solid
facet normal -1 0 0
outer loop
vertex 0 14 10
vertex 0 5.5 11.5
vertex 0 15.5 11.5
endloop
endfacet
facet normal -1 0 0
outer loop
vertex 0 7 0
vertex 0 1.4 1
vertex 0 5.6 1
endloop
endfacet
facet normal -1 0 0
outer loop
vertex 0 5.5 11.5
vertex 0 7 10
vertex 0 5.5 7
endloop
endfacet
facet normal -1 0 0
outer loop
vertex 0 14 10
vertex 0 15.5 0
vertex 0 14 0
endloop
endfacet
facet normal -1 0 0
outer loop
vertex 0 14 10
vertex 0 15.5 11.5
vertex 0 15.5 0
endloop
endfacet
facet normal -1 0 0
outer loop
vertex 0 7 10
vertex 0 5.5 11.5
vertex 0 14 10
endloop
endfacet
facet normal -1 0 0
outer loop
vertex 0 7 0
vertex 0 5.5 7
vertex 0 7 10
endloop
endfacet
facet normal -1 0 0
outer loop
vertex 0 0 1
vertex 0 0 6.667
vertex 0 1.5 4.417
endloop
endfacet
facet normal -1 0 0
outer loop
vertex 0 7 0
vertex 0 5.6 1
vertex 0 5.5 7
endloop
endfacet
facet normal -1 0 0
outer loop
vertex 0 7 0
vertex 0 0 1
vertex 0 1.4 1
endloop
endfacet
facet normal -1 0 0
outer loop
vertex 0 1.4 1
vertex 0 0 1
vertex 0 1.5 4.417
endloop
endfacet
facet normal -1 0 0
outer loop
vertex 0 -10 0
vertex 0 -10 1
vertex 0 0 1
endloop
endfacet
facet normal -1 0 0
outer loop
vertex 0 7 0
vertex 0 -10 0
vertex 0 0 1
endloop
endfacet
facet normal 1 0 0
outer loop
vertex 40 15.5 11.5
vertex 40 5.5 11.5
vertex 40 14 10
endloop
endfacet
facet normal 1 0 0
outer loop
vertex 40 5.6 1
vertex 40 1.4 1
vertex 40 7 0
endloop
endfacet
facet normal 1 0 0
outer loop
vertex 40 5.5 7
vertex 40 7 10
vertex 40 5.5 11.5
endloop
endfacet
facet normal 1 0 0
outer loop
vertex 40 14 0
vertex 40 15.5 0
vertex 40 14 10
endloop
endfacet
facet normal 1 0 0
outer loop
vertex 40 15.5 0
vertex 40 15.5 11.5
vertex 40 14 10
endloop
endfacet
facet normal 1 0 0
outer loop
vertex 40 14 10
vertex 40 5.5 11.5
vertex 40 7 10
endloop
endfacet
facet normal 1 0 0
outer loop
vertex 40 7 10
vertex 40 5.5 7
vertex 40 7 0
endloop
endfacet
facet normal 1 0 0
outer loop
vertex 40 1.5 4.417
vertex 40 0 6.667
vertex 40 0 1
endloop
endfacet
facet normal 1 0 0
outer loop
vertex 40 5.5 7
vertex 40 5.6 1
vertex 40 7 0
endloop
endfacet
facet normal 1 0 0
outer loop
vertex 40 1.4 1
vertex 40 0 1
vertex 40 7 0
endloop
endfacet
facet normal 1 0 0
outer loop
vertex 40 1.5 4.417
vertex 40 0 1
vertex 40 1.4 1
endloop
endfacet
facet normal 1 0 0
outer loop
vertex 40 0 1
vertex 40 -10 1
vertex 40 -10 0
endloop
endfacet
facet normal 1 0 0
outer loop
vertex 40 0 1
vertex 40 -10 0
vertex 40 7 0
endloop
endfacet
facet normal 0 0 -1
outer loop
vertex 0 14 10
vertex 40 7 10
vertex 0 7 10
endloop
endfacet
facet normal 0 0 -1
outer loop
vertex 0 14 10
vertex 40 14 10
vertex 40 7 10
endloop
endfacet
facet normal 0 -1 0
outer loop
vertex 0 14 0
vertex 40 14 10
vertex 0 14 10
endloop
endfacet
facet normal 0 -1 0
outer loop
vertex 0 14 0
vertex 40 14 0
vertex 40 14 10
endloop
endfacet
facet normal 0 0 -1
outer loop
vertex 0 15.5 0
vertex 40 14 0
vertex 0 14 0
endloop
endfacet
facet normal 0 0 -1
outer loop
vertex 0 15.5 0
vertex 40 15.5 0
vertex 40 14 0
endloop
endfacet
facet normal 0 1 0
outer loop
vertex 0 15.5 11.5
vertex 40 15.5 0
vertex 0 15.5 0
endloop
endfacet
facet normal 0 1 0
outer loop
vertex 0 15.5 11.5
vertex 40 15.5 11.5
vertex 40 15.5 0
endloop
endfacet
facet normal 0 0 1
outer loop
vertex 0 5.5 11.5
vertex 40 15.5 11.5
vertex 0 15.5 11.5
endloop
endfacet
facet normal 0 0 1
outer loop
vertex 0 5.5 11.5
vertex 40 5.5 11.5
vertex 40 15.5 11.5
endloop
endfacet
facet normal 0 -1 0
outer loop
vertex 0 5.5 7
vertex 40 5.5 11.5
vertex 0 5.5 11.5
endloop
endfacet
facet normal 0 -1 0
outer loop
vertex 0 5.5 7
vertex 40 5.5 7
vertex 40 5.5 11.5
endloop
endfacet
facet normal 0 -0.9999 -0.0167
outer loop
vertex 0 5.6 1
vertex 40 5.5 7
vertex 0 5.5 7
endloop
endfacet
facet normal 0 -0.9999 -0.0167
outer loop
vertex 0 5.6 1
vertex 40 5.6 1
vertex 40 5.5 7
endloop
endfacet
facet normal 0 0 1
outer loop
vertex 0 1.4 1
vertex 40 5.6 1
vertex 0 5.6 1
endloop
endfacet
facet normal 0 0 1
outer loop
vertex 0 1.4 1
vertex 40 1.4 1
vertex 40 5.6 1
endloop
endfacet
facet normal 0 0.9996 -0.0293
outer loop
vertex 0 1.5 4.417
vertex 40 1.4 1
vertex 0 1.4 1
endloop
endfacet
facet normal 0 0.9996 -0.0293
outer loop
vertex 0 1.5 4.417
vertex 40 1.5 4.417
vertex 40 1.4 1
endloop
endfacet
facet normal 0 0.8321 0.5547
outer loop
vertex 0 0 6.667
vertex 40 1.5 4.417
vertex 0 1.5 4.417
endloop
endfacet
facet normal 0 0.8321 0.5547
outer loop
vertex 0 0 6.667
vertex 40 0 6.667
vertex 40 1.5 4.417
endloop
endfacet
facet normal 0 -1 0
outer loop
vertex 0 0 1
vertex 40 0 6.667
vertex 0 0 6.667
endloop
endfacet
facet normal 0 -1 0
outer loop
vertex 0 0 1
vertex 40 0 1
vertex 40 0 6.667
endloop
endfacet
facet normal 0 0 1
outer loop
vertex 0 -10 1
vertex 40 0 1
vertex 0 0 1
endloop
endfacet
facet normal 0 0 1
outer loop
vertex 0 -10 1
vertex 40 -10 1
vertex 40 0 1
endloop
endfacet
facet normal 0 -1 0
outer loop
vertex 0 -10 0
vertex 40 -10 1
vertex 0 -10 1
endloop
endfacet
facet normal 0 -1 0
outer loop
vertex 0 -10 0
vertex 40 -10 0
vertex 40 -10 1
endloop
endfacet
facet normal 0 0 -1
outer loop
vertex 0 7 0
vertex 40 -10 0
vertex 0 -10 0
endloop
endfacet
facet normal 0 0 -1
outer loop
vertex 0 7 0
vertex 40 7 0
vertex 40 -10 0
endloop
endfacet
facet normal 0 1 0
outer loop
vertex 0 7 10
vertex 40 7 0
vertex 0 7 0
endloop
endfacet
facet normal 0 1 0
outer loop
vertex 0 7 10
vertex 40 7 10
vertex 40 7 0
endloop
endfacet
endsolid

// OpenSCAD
$fn = 200;  // Number of fragments used to construct curves and circles

module drawRing()
{    
    // panel holder
    holder_thickness = 1.5;
    holder_thickness_bottom = 1.0;
    panel_thickness = 4;
    panel_thickness_bottom = 4.2;
    panel_holder_width = 40;
    panel_holder_height = 10;
    panel_holder_thickness = panel_thickness + 2*holder_thickness;
    
    metal_floor_thickness = 7;
    floor_extra_length = 10;
    
    // holding tray with wedge for easy insertion of panel
    rotate([90, 0, 90])
    linear_extrude(panel_holder_width)
    polygon(points=[
        // outer wood side of S
        [0, 0],
        [panel_holder_thickness, 0],
        [panel_holder_thickness, panel_holder_height],
        // metal side of S
        [panel_holder_thickness+metal_floor_thickness, panel_holder_height],
        [panel_holder_thickness+metal_floor_thickness, 0],
        [panel_holder_thickness+metal_floor_thickness+holder_thickness, 0],
        [panel_holder_thickness+metal_floor_thickness+holder_thickness, panel_holder_height+holder_thickness],
        [panel_holder_thickness-holder_thickness, panel_holder_height+holder_thickness],
        // inner side of S
        [panel_holder_thickness-holder_thickness, panel_holder_height-2*holder_thickness],
        [panel_holder_thickness/2+panel_thickness_bottom/2, holder_thickness_bottom],
        [panel_holder_thickness/2-panel_thickness_bottom/2, holder_thickness_bottom],
        [holder_thickness, panel_holder_height/1.5-1.5*holder_thickness],
        [0, panel_holder_height/1.5],
        [0, holder_thickness_bottom],
        [-floor_extra_length, holder_thickness_bottom],
        [-floor_extra_length, 0],
    ]);
}


drawRing();
